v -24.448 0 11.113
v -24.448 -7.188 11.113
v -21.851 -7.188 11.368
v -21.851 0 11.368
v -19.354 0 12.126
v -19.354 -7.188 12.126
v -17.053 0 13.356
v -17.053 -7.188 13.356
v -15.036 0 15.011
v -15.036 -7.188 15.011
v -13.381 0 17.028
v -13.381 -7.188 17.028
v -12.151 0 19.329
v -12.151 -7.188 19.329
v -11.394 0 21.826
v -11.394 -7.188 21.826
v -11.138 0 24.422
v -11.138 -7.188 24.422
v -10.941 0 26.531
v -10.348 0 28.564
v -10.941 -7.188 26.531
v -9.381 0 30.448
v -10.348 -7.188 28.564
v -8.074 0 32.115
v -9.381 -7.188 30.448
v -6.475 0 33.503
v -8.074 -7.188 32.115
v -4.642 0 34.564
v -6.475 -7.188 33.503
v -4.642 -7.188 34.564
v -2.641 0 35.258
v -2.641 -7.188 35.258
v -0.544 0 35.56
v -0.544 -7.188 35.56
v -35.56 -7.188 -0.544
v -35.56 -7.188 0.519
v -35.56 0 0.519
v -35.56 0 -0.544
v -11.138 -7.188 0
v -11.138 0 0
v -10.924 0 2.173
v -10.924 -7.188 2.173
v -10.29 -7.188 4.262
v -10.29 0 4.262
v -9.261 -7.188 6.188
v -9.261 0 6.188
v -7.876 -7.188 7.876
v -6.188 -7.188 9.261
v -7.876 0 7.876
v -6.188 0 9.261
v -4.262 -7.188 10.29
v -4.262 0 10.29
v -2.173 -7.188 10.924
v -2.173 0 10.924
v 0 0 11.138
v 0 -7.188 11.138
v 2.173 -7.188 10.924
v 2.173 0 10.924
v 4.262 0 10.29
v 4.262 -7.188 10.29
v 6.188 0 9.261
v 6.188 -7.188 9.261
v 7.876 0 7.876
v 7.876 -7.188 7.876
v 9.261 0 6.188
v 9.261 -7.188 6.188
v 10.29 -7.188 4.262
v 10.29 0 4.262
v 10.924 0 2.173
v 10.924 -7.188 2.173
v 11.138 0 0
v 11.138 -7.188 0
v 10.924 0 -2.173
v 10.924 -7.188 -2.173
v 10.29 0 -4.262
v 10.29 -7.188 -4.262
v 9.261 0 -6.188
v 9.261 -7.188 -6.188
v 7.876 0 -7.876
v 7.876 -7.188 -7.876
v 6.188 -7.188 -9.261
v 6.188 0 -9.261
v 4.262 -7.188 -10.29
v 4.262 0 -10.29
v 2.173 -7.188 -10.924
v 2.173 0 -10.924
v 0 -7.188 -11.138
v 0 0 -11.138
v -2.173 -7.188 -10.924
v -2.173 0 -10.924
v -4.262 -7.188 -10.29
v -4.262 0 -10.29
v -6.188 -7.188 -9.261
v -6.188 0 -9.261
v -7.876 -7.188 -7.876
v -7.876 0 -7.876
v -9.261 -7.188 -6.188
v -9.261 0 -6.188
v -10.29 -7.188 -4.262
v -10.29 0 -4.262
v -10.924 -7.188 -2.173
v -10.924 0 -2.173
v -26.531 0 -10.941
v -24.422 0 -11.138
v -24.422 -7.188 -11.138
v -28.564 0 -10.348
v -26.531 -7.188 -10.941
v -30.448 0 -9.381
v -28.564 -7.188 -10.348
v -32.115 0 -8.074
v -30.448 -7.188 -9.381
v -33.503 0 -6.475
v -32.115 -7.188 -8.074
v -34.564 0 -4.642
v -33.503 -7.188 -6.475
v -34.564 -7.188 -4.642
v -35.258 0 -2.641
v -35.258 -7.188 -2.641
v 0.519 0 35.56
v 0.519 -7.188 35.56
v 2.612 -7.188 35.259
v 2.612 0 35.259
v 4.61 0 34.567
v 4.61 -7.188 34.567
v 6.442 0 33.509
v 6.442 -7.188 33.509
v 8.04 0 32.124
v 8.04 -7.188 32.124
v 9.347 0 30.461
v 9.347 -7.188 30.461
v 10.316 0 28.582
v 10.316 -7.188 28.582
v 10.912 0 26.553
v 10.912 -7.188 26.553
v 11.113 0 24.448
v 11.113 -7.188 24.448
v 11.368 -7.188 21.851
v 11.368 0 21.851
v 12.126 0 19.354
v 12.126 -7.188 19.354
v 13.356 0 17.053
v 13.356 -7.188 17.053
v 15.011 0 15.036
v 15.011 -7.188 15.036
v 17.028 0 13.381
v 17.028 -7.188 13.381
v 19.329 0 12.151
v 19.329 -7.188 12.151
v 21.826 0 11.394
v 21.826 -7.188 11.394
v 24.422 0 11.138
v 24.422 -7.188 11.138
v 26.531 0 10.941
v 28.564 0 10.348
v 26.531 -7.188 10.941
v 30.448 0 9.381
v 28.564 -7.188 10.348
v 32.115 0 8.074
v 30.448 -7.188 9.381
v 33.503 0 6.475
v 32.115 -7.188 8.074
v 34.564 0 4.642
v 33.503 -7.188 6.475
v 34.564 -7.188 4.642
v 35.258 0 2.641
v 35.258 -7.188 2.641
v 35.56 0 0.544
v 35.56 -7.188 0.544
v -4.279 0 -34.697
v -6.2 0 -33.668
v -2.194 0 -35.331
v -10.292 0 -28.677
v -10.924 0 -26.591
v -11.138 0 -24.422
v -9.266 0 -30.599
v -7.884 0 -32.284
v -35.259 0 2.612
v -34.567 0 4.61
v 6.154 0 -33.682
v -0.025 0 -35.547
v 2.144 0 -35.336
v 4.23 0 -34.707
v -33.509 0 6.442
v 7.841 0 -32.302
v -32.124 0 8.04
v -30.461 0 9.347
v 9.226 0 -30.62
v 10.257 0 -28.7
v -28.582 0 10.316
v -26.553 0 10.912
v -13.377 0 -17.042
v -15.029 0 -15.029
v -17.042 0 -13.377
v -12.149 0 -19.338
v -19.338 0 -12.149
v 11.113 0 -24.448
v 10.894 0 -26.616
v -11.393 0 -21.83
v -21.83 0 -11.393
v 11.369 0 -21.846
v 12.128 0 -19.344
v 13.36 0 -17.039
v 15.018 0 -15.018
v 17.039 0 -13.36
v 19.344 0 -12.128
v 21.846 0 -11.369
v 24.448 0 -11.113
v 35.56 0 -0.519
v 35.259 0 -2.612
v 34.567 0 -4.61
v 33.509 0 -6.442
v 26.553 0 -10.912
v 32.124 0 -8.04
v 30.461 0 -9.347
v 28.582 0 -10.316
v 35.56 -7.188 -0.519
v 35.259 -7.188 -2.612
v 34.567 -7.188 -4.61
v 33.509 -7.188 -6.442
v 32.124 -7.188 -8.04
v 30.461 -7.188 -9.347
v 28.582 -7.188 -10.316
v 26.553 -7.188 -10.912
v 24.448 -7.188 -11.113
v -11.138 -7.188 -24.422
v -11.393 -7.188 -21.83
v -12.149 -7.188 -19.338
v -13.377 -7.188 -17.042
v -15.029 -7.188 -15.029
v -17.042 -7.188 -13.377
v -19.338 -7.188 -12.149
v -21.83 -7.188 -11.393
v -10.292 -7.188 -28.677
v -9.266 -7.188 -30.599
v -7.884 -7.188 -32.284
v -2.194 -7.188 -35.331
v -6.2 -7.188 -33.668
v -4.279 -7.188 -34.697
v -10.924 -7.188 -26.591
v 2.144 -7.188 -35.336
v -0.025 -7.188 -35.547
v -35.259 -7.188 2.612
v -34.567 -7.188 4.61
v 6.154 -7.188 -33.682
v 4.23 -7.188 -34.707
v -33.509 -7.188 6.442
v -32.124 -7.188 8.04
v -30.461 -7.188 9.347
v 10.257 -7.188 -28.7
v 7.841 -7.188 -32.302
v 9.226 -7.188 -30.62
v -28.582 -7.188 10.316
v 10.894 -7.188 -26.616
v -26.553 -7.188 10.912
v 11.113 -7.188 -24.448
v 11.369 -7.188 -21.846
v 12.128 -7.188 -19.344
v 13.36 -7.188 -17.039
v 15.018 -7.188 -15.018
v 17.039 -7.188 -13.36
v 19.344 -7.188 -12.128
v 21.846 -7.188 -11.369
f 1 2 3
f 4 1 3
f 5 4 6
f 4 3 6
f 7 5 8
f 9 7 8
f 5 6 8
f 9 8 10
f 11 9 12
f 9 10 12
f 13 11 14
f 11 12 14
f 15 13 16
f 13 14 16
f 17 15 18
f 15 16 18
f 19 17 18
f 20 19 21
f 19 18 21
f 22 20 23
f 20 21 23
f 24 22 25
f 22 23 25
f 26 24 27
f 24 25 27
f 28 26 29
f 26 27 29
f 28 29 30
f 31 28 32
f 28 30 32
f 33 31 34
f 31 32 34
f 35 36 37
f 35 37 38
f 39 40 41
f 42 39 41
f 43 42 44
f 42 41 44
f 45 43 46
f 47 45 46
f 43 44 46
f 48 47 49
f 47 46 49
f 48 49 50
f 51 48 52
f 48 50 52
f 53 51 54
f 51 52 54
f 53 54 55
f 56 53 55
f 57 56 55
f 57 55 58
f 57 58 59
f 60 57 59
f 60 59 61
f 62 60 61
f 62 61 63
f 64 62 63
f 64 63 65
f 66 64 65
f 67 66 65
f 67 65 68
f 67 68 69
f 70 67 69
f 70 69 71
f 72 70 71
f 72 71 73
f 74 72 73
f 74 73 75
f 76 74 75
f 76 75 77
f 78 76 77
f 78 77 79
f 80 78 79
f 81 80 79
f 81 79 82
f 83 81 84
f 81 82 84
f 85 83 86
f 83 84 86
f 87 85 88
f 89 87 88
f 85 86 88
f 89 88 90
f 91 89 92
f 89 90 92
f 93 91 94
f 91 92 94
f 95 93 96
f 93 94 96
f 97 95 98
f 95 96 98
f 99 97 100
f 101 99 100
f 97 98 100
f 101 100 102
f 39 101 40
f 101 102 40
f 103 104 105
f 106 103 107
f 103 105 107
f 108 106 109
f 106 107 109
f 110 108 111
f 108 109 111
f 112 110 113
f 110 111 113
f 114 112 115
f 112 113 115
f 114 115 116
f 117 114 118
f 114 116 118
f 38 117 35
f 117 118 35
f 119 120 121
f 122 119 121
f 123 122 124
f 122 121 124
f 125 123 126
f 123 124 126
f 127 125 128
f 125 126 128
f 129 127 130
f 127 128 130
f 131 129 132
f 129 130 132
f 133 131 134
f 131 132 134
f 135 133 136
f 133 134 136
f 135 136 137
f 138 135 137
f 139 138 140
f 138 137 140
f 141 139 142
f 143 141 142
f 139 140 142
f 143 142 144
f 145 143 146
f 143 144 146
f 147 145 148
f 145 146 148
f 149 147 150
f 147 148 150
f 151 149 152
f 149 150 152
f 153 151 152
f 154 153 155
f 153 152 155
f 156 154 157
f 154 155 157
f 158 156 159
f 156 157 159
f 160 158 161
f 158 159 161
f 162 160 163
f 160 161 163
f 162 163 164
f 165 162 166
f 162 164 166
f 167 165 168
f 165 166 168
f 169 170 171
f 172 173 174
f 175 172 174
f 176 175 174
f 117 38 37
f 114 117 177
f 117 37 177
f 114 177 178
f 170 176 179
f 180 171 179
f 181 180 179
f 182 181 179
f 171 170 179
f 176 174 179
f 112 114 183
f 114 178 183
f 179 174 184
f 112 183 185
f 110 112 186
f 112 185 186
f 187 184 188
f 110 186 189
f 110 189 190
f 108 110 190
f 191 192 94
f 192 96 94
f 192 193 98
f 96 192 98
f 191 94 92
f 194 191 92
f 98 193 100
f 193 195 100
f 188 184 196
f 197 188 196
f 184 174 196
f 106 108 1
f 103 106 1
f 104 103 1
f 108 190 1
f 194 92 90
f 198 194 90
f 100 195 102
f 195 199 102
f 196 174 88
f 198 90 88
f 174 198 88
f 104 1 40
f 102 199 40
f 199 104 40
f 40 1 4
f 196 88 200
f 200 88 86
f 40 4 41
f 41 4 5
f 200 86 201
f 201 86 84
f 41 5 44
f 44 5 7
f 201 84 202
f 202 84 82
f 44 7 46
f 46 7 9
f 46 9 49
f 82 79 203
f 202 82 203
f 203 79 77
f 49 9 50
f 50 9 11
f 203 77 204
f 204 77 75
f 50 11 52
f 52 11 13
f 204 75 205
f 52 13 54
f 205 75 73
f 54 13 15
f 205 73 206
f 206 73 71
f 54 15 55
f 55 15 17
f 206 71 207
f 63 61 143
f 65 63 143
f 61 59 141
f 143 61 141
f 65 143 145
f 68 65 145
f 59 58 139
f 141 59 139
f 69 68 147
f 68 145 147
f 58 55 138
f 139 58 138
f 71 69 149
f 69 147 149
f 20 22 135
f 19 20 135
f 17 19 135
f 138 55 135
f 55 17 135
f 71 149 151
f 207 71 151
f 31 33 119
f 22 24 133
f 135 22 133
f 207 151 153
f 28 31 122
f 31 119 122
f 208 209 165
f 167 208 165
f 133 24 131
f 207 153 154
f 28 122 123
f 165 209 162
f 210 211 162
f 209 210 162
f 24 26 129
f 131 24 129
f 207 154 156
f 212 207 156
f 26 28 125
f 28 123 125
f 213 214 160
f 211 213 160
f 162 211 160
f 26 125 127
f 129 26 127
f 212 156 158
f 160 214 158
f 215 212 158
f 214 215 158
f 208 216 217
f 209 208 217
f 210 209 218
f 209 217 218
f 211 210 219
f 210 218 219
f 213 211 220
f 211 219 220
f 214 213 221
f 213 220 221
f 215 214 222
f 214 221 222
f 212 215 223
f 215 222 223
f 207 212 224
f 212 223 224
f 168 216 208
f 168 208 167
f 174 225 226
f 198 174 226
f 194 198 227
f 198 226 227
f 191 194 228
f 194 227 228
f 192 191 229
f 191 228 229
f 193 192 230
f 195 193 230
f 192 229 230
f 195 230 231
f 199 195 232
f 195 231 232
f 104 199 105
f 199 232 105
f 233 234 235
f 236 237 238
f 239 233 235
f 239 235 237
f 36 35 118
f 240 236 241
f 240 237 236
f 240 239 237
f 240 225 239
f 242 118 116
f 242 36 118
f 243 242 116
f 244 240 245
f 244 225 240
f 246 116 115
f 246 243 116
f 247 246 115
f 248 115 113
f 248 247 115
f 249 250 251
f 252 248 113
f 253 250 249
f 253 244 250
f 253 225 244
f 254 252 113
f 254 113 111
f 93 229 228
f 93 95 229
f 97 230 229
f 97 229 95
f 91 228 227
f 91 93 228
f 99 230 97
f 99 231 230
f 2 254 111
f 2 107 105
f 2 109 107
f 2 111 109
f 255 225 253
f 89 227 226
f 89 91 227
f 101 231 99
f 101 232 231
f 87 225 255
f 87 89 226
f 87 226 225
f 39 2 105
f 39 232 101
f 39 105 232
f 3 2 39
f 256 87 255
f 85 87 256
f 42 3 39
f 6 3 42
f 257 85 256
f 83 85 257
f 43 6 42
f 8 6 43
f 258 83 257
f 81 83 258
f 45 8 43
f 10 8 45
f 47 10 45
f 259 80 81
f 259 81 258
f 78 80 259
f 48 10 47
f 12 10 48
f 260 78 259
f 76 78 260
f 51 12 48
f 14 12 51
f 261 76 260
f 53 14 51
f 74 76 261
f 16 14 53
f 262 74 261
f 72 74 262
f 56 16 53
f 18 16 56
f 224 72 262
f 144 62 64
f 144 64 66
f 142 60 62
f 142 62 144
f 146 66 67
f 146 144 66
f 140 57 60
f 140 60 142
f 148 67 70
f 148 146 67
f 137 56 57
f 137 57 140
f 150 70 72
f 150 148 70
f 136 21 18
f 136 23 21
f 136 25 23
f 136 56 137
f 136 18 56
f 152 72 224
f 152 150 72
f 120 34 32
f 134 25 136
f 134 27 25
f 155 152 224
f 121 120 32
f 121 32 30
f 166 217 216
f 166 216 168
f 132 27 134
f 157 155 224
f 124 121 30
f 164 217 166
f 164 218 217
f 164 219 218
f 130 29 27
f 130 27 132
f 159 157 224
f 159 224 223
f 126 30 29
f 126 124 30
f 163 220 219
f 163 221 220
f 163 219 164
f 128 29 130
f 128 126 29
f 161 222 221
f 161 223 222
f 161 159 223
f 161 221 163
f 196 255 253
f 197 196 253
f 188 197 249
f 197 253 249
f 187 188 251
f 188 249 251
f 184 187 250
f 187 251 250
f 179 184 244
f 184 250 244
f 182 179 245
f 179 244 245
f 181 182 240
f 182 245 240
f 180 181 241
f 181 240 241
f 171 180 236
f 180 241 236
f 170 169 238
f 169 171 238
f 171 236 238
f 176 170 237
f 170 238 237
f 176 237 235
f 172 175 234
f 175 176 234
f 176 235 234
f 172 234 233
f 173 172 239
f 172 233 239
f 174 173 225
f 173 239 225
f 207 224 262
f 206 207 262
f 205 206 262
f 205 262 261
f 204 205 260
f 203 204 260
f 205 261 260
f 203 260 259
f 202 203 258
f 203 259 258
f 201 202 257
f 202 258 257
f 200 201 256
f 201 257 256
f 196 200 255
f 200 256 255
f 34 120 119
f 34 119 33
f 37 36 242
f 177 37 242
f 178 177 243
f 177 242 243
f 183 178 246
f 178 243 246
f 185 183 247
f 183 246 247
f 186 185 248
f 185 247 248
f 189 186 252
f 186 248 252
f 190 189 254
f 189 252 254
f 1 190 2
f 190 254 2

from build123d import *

# Parameters (mm, degrees)
F0_R      = 35.56
F1_DEPTH  = 7.1882
F2_R      = 11.1379
F3_DEPTH  = 7.62
F7_DEPTH  = 7.1882
F9_DEPTH  = 7.1882
F11_DEPTH = 7.1882
F13_DEPTH = 7.1882
F15_DEPTH = 25.4


# Not quite as in the source:
# - a feature of the source that left no trace in its solid (it failed there, or was rolled back) is left out


with BuildPart() as f1:
    # F0 (on Front) → F1 (new body)
    with BuildSketch(Plane.XZ):
        Circle(F0_R)
    extrude(amount=F1_DEPTH)

    # F2 (on face) → F3 (cut)
    with BuildSketch(Plane(origin=(0, 0, 0), x_dir=(-1, 0, 0), z_dir=(0, 1, 0))):
        Circle(F2_R)
    extrude(amount=-F3_DEPTH, mode=Mode.SUBTRACT)

    # F6 (on face) → F7 (join)
    with BuildSketch(Plane.XZ.offset(7.1882)):
        with BuildLine():
            Line((35.56, 11.1379), (33.7707089589, 11.1379))
            ThreePointArc((33.7707089589, 11.1379), (35.1098277593, 5.6403541298), (35.56, 0))
            Line((35.56, 0), (35.56, 11.1379))
        make_face()
        with BuildLine():
            Line((35.56, -11.1125), (35.56, 0))
            ThreePointArc((35.56, 0), (35.1119461572, -5.6271517709), (33.7790755313, -11.1125))
            Line((33.7790755313, -11.1125), (35.56, -11.1125))
        make_face()
    extrude(amount=-F7_DEPTH)

    # F8 (on face) → F9 (join)
    with BuildSketch(Plane.XZ.offset(7.1882)):
        with BuildLine():
            Line((-11.1379, 35.56), (-11.1379, 33.7707089589))
            ThreePointArc((-11.1379, 33.7707089589), (-5.6403540801, 35.1098277673), (1.006e-07, 35.56))
            Line((1.006e-07, 35.56), (-11.1379, 35.56))
        make_face()
        with BuildLine():
            Line((11.1125, 35.56), (1.006e-07, 35.56))
            ThreePointArc((1.006e-07, 35.56), (5.6271518206, 35.1119461492), (11.1125, 33.7790755313))
            Line((11.1125, 33.7790755313), (11.1125, 35.56))
        make_face()
    extrude(amount=-F9_DEPTH)

    # F10 (on face) → F11 (join)
    with BuildSketch(Plane.XZ.offset(7.1882)):
        with BuildLine():
            ThreePointArc((-35.56, 0), (-35.1119461572, 5.627151771), (-33.7790755313, 11.1125))
            Line((-33.7790755313, 11.1125), (-35.56, 11.1125))
            Line((-35.56, 11.1125), (-35.56, 0))
        make_face()
        with BuildLine():
            Line((-35.56, -11.1379), (-33.7707089589, -11.1379))
            ThreePointArc((-33.7707089589, -11.1379), (-35.1098277593, -5.6403541298), (-35.56, 0))
            Line((-35.56, 0), (-35.56, -11.1379))
        make_face()
    extrude(amount=-F11_DEPTH)

    # F12 (on face) → F13 (join)
    with BuildSketch(Plane.XZ.offset(7.1882)):
        with BuildLine():
            ThreePointArc((0, -35.56), (-5.6403541298, -35.1098277593), (-11.1379, -33.7707089589))
            Line((-11.1379, -33.7707089589), (-11.1379, -35.56))
            Line((-11.1379, -35.56), (0, -35.56))
        make_face()
        with BuildLine():
            Line((11.1125, -35.56), (11.1125, -33.7790755313))
            ThreePointArc((11.1125, -33.7790755313), (5.6271517709, -35.1119461572), (0, -35.56))
            Line((0, -35.56), (11.1125, -35.56))
        make_face()
    extrude(amount=-F13_DEPTH)

    # F14 (on face) → F15 (cut)
    with BuildSketch(Plane.XZ.offset(7.1882)):
        with BuildLine():
            ThreePointArc((-11.1379, 24.4221), (-8.0739891454, 32.1147190965), (-0.5444488019, 35.56))
            Line((-0.5444488019, 35.56), (-11.1379, 35.56))
            Line((-11.1379, 35.56), (-11.1379, 33.7707089589))
            ThreePointArc((-11.1379, 33.7707089589), (-25.1541702512, 25.1352604716), (-33.7790755313, 11.1125))
            Line((-33.7790755313, 11.1125), (-35.56, 11.1125))
            Line((-35.56, 11.1125), (-35.56, 0.5190198064))
            ThreePointArc((-35.56, 0.5190198064), (-32.1239164631, 8.03980237), (-24.4475, 11.1125))
            ThreePointArc((-24.4475, 11.1125), (-15.0361915851, 15.0107915851), (-11.1379, 24.4221))
        make_face()
        with BuildLine():
            Line((-0.5444488019, 35.56), (0.5190198064, 35.56))
            ThreePointArc((0.5190198064, 35.56), (-0.0127144977, 35.5727144977), (-0.5444488019, 35.56))
        make_face()
        with BuildLine():
            ThreePointArc((0.5190198064, 35.56), (8.03980237, 32.1239164631), (11.1125, 24.4475))
            ThreePointArc((11.1125, 24.4475), (15.0107915851, 15.0361915851), (24.4221, 11.1379))
            ThreePointArc((24.4221, 11.1379), (32.1147190965, 8.0739891454), (35.56, 0.5444488019))
            Line((35.56, 0.5444488019), (35.56, 11.1379))
            Line((35.56, 11.1379), (33.7707089589, 11.1379))
            ThreePointArc((33.7707089589, 11.1379), (25.1352604716, 25.1541702512), (11.1125, 33.7790755313))
            Line((11.1125, 33.7790755313), (11.1125, 35.56))
            Line((11.1125, 35.56), (0.5190198064, 35.56))
        make_face()
        with BuildLine():
            ThreePointArc((35.56, -0.5190198064), (35.5727144977, 0.0127144977), (35.56, 0.5444488019))
            Line((35.56, 0.5444488019), (35.56, -0.5190198064))
        make_face()
        with BuildLine():
            Line((35.56, -11.1125), (35.56, -0.5190198064))
            ThreePointArc((35.56, -0.5190198064), (32.1239164631, -8.03980237), (24.4475, -11.1125))
            ThreePointArc((24.4475, -11.1125), (15.0182310729, -15.0182310729), (11.1125, -24.4475))
            ThreePointArc((11.1125, -24.4475), (-0.0253855106, -35.5473072489), (-11.1379, -24.4221))
            ThreePointArc((-11.1379, -24.4221), (-15.0287520974, -15.0287520974), (-24.4221, -11.1379))
            ThreePointArc((-24.4221, -11.1379), (-32.1147190965, -8.0739891454), (-35.56, -0.5444488019))
            Line((-35.56, -0.5444488019), (-35.56, -11.1379))
            Line((-35.56, -11.1379), (-33.7707089589, -11.1379))
            ThreePointArc((-33.7707089589, -11.1379), (-25.144717139, -25.144717139), (-11.1379, -33.7707089589))
            Line((-11.1379, -33.7707089589), (-11.1379, -35.56))
            Line((-11.1379, -35.56), (11.1125, -35.56))
            Line((11.1125, -35.56), (11.1125, -33.7790755313))
            ThreePointArc((11.1125, -33.7790755313), (25.144717139, -25.144717139), (33.7790755313, -11.1125))
            Line((33.7790755313, -11.1125), (35.56, -11.1125))
        make_face()
        with BuildLine():
            Line((-35.56, -0.5444488019), (-35.56, 0.5190198064))
            ThreePointArc((-35.56, 0.5190198064), (-35.5727144977, -0.0127144977), (-35.56, -0.5444488019))
        make_face()
    extrude(amount=-F15_DEPTH, mode=Mode.SUBTRACT)


solid = f1.part
